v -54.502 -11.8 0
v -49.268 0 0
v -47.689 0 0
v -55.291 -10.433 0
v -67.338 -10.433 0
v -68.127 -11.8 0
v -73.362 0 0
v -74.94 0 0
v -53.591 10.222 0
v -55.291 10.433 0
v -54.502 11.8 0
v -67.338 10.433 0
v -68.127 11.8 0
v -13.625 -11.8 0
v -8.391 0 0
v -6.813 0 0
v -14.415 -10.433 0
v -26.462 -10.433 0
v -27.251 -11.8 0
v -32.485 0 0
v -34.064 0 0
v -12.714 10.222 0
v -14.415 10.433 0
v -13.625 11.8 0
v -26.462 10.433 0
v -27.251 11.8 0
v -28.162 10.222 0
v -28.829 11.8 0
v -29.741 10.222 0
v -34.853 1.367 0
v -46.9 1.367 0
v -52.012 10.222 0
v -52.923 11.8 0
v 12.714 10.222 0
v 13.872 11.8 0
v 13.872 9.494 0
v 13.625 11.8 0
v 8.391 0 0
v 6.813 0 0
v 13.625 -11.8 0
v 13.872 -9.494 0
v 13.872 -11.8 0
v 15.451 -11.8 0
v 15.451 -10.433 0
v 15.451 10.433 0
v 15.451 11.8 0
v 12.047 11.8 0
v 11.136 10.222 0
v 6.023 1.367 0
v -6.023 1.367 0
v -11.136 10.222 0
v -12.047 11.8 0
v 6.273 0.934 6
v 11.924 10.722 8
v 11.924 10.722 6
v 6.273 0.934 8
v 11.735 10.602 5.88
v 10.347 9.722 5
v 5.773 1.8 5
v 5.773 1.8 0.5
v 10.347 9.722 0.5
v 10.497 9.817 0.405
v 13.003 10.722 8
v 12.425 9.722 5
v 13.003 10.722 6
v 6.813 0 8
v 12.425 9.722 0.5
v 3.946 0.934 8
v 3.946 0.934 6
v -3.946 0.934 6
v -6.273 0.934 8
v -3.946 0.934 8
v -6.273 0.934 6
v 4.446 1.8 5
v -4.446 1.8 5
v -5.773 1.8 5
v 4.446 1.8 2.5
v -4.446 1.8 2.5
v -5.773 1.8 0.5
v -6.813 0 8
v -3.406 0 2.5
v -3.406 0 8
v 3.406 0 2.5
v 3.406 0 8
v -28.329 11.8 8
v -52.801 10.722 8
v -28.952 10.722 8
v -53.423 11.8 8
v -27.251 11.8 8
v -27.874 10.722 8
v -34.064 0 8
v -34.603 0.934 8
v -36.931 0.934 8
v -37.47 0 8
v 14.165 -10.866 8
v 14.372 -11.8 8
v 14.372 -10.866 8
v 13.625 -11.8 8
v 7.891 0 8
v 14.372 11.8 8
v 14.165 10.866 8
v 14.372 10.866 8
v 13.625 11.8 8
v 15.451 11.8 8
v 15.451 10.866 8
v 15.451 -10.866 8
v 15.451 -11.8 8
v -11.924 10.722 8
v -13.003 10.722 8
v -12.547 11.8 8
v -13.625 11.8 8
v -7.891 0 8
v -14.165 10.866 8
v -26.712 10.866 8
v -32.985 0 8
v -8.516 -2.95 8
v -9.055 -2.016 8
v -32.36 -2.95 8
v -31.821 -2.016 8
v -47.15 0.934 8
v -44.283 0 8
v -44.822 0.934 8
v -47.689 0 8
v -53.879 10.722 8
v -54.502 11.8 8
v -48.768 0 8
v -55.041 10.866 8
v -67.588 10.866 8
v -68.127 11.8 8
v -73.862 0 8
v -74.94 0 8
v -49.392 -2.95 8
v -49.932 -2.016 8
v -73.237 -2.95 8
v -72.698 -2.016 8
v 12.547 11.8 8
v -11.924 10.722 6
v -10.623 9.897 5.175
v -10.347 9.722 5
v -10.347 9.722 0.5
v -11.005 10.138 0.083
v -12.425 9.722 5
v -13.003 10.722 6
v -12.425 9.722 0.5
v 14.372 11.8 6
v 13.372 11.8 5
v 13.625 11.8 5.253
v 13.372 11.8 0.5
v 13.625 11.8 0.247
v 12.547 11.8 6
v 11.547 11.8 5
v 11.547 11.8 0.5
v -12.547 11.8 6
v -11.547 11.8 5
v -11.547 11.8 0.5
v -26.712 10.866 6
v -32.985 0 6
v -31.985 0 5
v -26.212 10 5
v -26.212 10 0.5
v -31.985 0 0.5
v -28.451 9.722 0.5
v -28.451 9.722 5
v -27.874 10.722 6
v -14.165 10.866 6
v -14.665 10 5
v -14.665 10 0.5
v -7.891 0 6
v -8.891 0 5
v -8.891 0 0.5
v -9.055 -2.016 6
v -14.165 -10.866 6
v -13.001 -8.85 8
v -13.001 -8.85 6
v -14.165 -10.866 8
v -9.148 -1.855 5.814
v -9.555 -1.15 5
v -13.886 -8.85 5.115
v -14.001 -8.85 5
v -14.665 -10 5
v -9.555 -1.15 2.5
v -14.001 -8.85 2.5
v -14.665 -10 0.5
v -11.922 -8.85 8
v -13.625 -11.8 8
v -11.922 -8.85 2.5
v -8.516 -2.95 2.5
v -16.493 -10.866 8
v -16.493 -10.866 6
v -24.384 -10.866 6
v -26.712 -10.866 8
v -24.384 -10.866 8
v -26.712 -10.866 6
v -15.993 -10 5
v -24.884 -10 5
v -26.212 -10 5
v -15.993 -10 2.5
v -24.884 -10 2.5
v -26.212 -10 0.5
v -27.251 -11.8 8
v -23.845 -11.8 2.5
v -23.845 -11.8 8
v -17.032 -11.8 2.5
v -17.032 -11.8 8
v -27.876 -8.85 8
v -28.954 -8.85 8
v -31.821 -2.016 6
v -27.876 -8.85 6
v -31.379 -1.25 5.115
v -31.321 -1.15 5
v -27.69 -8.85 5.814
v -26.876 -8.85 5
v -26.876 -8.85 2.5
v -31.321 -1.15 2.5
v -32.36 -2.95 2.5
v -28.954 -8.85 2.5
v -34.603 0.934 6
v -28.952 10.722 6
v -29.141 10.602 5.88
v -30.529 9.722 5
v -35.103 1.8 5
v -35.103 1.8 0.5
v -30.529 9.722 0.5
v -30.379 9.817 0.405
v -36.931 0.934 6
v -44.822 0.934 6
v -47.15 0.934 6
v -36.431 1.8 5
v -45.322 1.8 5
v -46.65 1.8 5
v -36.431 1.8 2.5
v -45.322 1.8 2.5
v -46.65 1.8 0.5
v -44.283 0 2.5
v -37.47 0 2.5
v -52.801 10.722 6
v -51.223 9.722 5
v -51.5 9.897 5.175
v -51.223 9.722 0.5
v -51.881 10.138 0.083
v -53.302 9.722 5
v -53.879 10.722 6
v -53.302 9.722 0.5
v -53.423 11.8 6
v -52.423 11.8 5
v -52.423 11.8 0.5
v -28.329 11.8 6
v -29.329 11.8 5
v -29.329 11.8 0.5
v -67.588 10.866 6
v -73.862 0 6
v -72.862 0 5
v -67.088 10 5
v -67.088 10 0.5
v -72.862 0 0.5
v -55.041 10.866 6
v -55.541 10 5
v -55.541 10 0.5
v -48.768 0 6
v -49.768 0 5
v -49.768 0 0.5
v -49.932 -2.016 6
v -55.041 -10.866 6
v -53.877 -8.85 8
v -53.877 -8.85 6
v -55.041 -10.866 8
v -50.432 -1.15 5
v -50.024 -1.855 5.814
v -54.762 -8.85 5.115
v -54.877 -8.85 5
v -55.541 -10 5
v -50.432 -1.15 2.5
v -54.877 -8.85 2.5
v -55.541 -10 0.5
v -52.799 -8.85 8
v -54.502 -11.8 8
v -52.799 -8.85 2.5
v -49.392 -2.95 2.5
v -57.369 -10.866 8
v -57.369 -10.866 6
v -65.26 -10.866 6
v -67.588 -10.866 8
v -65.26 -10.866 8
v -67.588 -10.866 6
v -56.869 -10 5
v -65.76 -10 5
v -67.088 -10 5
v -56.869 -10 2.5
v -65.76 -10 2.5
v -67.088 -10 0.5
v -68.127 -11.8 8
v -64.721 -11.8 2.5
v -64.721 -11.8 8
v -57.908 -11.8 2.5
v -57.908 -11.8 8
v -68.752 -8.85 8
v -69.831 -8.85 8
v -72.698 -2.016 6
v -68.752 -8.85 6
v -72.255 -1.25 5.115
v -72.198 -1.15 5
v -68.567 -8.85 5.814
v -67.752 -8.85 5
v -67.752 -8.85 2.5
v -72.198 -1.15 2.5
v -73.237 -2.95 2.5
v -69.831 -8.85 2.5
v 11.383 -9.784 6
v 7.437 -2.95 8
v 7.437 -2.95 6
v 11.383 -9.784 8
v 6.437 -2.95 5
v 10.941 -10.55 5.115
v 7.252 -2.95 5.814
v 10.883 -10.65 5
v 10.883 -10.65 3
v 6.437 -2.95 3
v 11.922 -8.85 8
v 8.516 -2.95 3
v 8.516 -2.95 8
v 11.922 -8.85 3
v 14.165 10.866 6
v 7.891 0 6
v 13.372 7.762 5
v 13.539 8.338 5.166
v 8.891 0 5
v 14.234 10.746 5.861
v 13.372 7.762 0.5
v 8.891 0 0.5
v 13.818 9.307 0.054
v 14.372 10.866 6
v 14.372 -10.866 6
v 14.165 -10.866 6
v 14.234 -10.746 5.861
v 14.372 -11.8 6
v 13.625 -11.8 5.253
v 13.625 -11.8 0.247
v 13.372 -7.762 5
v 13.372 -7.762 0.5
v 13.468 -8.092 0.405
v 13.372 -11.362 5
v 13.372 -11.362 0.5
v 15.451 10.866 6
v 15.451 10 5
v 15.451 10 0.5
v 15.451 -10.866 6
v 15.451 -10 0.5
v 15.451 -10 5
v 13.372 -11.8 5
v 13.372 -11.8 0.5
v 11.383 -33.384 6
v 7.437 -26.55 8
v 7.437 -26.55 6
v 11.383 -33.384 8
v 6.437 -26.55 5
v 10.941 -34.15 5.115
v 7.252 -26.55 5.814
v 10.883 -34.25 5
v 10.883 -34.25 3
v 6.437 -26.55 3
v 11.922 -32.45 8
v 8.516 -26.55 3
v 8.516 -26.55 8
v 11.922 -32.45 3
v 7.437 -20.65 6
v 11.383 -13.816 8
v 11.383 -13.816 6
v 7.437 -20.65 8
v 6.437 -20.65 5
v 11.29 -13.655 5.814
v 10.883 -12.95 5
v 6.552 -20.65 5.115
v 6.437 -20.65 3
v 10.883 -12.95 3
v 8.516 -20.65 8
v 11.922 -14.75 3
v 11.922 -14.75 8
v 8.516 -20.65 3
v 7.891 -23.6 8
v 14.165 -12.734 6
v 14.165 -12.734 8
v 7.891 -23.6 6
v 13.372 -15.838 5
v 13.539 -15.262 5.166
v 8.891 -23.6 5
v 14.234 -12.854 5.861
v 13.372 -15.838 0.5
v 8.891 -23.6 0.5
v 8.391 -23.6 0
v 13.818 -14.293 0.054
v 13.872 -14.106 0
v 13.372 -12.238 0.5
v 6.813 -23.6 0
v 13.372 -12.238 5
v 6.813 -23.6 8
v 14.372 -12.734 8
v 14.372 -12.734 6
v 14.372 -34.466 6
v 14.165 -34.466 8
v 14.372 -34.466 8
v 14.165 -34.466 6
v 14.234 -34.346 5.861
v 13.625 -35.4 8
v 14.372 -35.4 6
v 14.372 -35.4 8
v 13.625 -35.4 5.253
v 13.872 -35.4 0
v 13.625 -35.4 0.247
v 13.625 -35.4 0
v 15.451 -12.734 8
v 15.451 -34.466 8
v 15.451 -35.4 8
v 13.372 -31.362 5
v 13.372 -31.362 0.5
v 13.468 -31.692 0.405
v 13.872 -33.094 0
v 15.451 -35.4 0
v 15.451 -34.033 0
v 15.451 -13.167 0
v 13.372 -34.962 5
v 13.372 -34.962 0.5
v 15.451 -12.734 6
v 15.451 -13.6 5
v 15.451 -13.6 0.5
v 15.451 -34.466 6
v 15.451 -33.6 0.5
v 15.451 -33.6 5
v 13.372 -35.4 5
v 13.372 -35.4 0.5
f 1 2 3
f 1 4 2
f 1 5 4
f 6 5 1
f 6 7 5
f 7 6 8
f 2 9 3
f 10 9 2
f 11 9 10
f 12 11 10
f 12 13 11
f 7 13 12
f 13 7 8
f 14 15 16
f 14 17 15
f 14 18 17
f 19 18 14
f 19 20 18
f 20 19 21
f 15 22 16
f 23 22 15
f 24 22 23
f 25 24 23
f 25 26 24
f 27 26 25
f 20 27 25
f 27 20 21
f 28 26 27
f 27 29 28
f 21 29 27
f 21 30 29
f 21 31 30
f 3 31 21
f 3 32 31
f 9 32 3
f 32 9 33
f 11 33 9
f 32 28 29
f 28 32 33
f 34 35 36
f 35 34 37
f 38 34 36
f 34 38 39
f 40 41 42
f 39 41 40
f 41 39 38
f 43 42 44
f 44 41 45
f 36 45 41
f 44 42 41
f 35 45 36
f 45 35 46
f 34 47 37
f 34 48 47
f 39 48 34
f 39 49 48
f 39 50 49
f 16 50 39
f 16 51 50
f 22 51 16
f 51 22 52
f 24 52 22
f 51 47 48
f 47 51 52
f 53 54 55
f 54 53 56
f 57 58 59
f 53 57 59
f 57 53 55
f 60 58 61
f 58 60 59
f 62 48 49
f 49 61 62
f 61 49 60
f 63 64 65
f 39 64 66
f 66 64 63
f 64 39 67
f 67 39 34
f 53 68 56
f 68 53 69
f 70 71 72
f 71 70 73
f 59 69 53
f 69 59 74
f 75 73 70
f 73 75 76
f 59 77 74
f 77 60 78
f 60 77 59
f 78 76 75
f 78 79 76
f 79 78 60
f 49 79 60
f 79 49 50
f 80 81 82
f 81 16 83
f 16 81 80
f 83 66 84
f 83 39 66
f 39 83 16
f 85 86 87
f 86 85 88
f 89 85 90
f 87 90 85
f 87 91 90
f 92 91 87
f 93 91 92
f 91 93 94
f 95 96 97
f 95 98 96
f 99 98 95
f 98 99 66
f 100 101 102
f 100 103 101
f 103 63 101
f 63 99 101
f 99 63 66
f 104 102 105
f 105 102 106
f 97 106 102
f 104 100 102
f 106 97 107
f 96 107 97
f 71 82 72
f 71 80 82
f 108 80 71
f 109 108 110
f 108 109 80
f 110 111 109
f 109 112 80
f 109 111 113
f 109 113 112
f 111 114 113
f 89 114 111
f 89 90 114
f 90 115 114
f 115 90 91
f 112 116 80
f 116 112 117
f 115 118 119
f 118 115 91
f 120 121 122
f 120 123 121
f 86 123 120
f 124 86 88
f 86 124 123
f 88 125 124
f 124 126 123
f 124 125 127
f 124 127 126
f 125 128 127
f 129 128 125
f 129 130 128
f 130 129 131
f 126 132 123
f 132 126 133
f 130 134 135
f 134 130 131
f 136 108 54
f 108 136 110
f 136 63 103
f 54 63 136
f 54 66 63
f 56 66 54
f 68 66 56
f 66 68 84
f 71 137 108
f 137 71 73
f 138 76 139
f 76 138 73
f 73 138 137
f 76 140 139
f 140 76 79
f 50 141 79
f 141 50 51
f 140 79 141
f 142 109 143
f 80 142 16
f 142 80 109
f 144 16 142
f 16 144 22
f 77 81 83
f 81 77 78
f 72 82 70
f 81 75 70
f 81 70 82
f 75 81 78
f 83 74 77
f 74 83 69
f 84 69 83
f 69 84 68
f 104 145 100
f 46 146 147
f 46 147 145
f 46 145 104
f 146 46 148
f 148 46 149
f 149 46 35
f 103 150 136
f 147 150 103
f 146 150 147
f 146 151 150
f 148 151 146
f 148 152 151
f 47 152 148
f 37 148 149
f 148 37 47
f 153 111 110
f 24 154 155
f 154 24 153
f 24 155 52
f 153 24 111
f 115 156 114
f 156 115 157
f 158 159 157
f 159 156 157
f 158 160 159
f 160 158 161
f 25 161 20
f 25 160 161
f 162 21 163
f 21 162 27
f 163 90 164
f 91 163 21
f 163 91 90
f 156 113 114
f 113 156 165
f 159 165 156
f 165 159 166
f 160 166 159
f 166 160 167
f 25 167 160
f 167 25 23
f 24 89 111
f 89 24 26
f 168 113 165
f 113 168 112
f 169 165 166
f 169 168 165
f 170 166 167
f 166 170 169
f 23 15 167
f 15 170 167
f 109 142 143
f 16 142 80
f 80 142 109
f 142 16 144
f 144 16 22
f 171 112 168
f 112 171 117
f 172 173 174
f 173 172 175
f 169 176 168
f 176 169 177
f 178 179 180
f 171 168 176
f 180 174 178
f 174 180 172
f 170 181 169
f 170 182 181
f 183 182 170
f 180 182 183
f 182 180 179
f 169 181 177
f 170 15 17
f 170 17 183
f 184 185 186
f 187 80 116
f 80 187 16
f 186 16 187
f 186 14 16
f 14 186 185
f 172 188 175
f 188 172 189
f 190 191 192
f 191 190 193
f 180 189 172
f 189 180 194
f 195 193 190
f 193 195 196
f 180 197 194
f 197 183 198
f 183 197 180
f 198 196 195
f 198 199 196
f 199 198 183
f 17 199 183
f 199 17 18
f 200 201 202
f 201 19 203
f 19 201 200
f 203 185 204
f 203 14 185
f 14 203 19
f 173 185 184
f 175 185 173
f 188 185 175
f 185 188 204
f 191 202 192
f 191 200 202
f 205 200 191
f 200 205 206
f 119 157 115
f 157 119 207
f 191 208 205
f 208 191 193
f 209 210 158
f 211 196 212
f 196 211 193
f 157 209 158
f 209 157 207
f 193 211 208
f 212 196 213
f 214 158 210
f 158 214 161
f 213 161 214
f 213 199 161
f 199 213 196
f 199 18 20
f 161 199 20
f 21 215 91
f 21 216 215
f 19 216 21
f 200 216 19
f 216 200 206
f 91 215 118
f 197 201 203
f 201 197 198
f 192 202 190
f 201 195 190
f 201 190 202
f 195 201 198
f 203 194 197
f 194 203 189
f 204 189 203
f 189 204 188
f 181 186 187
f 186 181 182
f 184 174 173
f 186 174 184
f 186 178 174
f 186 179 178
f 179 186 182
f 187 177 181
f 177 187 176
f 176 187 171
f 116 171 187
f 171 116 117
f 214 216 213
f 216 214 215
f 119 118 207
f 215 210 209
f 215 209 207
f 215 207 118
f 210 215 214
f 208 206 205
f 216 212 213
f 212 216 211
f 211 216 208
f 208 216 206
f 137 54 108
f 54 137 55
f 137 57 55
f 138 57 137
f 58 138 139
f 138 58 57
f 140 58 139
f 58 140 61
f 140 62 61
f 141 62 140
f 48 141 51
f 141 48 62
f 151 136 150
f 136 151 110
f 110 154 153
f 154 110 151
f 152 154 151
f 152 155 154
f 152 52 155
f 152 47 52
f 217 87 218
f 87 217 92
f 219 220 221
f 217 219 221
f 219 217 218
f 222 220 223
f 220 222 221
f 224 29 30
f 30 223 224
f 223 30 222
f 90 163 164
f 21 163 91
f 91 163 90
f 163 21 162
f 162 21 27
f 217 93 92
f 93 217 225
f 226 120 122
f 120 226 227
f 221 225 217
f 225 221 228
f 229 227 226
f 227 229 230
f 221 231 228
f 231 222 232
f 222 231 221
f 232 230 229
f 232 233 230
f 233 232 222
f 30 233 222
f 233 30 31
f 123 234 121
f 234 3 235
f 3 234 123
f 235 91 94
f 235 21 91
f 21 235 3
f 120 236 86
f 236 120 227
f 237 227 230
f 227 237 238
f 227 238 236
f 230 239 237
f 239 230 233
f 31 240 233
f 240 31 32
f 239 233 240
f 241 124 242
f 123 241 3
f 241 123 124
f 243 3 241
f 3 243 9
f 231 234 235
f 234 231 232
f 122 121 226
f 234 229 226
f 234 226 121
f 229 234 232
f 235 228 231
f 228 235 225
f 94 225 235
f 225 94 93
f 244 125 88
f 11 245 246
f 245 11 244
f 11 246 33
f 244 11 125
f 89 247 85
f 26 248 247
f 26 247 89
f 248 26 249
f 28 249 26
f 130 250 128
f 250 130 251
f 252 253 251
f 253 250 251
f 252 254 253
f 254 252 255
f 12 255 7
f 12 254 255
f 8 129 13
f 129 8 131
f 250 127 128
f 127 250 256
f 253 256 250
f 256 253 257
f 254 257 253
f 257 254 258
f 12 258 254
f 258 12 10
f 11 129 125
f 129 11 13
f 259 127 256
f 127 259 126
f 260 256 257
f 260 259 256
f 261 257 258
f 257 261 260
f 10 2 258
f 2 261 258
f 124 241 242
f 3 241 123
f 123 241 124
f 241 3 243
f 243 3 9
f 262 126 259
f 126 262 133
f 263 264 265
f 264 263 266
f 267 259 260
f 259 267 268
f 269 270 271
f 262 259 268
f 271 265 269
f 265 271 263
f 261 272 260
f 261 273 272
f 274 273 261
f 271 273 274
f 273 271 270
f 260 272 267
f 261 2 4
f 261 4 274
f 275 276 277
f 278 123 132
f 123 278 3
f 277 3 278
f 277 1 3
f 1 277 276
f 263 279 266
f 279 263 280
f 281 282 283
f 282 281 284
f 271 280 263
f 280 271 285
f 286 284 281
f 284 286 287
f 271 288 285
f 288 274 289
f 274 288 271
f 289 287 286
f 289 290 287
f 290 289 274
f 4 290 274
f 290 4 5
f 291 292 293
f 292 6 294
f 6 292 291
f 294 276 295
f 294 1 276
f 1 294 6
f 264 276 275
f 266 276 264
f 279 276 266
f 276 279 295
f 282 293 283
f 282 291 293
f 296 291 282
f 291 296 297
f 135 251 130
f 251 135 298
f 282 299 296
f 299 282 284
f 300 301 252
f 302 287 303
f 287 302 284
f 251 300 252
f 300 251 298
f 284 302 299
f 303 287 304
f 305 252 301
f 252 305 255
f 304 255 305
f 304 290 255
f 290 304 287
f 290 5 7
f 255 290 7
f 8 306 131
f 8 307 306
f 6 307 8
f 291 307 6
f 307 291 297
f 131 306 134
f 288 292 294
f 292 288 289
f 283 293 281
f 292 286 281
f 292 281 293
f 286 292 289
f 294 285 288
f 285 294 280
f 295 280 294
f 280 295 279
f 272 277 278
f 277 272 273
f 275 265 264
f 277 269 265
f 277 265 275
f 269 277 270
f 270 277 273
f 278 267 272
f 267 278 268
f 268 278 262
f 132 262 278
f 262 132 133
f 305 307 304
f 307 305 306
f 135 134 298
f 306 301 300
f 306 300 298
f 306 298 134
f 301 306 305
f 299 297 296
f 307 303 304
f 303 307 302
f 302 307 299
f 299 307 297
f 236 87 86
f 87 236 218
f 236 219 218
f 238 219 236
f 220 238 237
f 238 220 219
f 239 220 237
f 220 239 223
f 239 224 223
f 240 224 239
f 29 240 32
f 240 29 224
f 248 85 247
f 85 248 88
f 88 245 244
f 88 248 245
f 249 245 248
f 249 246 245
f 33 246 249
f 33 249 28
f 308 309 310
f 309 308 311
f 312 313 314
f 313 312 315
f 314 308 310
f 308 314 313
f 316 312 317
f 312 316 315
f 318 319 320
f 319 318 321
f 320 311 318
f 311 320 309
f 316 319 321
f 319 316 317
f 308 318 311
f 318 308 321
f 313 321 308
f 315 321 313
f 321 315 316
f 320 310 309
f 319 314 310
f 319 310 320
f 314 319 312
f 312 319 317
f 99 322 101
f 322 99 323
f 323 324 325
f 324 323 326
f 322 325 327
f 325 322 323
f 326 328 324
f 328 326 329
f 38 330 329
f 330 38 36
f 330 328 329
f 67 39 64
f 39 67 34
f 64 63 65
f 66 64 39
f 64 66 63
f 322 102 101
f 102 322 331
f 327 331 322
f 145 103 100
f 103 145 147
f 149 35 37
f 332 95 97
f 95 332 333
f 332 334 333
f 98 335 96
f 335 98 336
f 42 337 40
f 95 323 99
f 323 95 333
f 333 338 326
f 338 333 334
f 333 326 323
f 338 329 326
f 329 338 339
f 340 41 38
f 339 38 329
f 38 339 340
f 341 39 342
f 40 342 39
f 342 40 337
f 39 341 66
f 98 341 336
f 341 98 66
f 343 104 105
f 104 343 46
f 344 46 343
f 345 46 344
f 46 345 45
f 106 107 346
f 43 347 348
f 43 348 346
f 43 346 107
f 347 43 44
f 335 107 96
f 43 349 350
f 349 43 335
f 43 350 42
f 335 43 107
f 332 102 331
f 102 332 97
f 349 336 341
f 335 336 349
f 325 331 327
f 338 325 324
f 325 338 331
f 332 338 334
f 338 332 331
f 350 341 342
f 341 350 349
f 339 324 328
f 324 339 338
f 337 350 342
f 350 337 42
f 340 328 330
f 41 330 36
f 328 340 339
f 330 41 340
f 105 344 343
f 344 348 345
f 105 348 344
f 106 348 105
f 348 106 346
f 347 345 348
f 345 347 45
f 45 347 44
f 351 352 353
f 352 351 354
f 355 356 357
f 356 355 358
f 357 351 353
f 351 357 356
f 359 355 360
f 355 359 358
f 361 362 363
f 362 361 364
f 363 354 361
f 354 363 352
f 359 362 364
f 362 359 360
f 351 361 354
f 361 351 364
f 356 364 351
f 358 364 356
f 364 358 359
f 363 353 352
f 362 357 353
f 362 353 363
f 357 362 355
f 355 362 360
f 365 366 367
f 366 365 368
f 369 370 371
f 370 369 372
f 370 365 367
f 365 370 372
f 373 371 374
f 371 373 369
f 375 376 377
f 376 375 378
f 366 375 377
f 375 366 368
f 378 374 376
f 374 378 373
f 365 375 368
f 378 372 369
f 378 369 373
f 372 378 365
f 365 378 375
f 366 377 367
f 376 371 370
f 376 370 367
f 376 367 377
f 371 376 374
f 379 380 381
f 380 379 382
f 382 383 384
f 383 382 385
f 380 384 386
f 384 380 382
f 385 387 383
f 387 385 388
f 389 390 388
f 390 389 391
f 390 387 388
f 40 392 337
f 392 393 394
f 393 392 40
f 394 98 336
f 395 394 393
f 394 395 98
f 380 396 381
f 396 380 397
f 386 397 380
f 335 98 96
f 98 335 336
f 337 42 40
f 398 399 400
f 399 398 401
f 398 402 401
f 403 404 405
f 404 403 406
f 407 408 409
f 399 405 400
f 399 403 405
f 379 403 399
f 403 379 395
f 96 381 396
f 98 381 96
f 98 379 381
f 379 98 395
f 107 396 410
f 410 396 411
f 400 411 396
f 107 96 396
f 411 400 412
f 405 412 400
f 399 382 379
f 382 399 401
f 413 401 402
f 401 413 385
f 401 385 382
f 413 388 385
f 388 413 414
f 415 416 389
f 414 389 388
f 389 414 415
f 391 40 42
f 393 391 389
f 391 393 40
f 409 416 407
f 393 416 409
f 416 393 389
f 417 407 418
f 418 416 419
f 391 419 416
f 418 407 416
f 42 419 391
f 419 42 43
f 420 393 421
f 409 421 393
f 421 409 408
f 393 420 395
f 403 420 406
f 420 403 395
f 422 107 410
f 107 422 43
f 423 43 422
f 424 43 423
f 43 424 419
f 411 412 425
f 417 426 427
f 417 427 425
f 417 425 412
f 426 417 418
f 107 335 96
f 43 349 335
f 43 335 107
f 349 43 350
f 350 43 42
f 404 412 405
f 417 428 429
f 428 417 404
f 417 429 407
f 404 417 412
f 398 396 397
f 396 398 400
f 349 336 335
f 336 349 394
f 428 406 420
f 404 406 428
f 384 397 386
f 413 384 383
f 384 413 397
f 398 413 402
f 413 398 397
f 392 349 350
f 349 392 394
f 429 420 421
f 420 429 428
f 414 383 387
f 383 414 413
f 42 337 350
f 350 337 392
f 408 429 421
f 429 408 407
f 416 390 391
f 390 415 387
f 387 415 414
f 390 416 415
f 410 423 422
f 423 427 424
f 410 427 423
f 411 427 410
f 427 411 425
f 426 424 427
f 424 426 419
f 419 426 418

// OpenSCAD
$fn = 50;

radius = 13.6;
diameter =  radius * 2;

h_inner = 10;
r_inner = h_inner * 2/sqrt(3);

h_outer = 10+1.8;
r_outer = h_outer * 2/sqrt(3);


h_thin = 10+1;
r_thin = h_thin * 2/sqrt(3);

total_height = 8;

small_value = 0.1;


clips_height = 5;
clips_offset = 0.5;
clips_side_offset = 0.00;


module basic_polygon() {
    polygon([[r_outer, total_height], [r_outer, 0], [r_inner+0.5, 0], [r_inner, 0.5], 
        [r_inner, total_height-3], [r_inner+1, total_height-2], [r_inner+1, total_height]]);    
}

module basic_model() {
    rotate_extrude($fn=6) {
      basic_polygon();
    }
}


module panel_with_clips(pin_1=false, pin_2=false, pin_3=false, pin_4=false, pin_5=false, pin_6=false, slot_1=false, slot_2=false, slot_3=false, slot_4=false, slot_5=false, slot_6=false) {



difference() {
basic_model();

if (slot_1) {
rotate([0, 0, 0])
translate([0, -h_outer*2, total_height - (clips_height+clips_offset)/2])
  linear_extrude(height=clips_height+clips_offset, center=true)
    polygon([[clips_side_offset, h_outer/2], [-clips_side_offset, h_outer/2], [-r_outer/2-clips_side_offset, h_outer*1.5], [r_outer/2+clips_side_offset, h_outer*1.5]]);
}

if (slot_2) {
rotate([0, 0, 60])
translate([0, -h_outer*2, total_height - (clips_height+clips_offset)/2])
  linear_extrude(height=clips_height+clips_offset, center=true)
    polygon([[clips_side_offset, h_outer/2], [-clips_side_offset, h_outer/2], [-r_outer/2-clips_side_offset, h_outer*1.5], [r_outer/2+clips_side_offset, h_outer*1.5]]);
}



if (slot_3) {
rotate([0, 0, 120])
translate([0, -h_outer*2, total_height - (clips_height+clips_offset)/2])
  linear_extrude(height=clips_height+clips_offset, center=true)
    polygon([[clips_side_offset, h_outer/2], [-clips_side_offset, h_outer/2], [-r_outer/2-clips_side_offset, h_outer*1.5], [r_outer/2+clips_side_offset, h_outer*1.5]]);
}

if (slot_4) {
rotate([0, 0, 180])
translate([0, -h_outer*2, total_height - (clips_height+clips_offset)/2])
  linear_extrude(height=clips_height+clips_offset, center=true)
    polygon([[clips_side_offset, h_outer/2], [-clips_side_offset, h_outer/2], [-r_outer/2-clips_side_offset, h_outer*1.5], [r_outer/2+clips_side_offset, h_outer*1.5]]);
}

if (slot_5) {
rotate([0, 0, 240])
translate([0, -h_outer*2, total_height - (clips_height+clips_offset)/2])
  linear_extrude(height=clips_height+clips_offset, center=true)
    polygon([[clips_side_offset, h_outer/2], [-clips_side_offset, h_outer/2], [-r_outer/2-clips_side_offset, h_outer*1.5], [r_outer/2+clips_side_offset, h_outer*1.5]]);
}

if (slot_6) {
rotate([0, 0, 300])
translate([0, -h_outer*2, total_height - (clips_height+clips_offset)/2])
  linear_extrude(height=clips_height+clips_offset, center=true)
    polygon([[clips_side_offset, h_outer/2], [-clips_side_offset, h_outer/2], [-r_outer/2-clips_side_offset, h_outer*1.5], [r_outer/2+clips_side_offset, h_outer*1.5]]);
}


}


if (pin_1) {
intersection() {
  translate([0,-h_outer*2, 0])
    basic_model();
translate([0, 0, total_height - clips_height/2]) {
  rotate([0, 0, -180])  
  linear_extrude(height=clips_height, center=true)
    polygon([[0, h_outer/2], [-r_outer/2, h_outer*1.5], [r_outer/2, h_outer*1.5]]);  
}
}
}

if (pin_2) {
intersection() {
  translate([r_outer*1.5,-h_outer, 0])
    basic_model();
translate([0, 0, total_height - clips_height/2]) {
  rotate([0, 0, -120])  
  linear_extrude(height=clips_height, center=true)
    polygon([[0, h_outer/2], [-r_outer/2, h_outer*1.5], [r_outer/2, h_outer*1.5]]);  
}
}
}


if (pin_3) {
intersection() {
  translate([r_outer*1.5,h_outer, 0])
    basic_model();
translate([0, 0, total_height - clips_height/2]) {
  rotate([0, 0, -60])  
  linear_extrude(height=clips_height, center=true)
    polygon([[0, h_outer/2], [-r_outer/2, h_outer*1.5], [r_outer/2, h_outer*1.5]]);  
}
}
}

if (pin_4) {
intersection() {
translate([0, h_outer*2, 0])
  basic_model();

translate([0, 0, total_height - clips_height/2]) {
  linear_extrude(height=clips_height, center=true)
    polygon([[0, h_outer/2], [-r_outer/2, h_outer*1.5], [r_outer/2, h_outer*1.5]]);
}  
}
}

if (pin_5) {
intersection() {
  translate([-r_outer*1.5,h_outer, 0])
    basic_model();
translate([0, 0, total_height - clips_height/2]) {
  rotate([0, 0, 60])  
  linear_extrude(height=clips_height, center=true)
    polygon([[0, h_outer/2], [-r_outer/2, h_outer*1.5], [r_outer/2, h_outer*1.5]]);  
}
}
}
  
if (pin_6) {
intersection() {
  translate([-r_outer*1.5, -h_outer, 0])
    basic_model();

translate([0, 0, total_height - clips_height/2]) {
  rotate([0, 0, 120])  
  linear_extrude(height=clips_height, center=true)
    polygon([[0, h_outer/2], [-r_outer/2, h_outer*1.5], [r_outer/2, h_outer*1.5]]);  
}
}
}


}


module panel_9x9() {
    for (i = [0:8]) {
        for (j = [0:8]) {
            if (j%2==0) {
               translate([r_outer*1.5*j, h_outer+h_outer*2*i, 0])
                  panel_with_clips(
                    slot_1 = i == 0,
                    slot_2 = j == 8,               
                    slot_3 = j == 8,  
                    pin_3 = i == 8 && j != 8,    
                    pin_4 = i == 8,
                    pin_5 = i == 8 || j == 0,
                    pin_6 = j == 0
                    
                  );
            } else {
               translate([r_outer*1.5*j, h_outer*2*i, 0])
                  panel_with_clips(
                    slot_1 = i == 0,
                    slot_2 = i == 0,
                    pin_4 = i == 8,
                    slot_6 = i == 0
                  );
            }
        }
    }
}


// panel_with_clips();


//panel_9x9();

module perimeter_top_item() {
  difference() {
    translate([0, h_outer, 0])
        panel_with_clips(slot_1=true);  
    
    translate([0, 50+h_outer, 0])
        cube([100, 100, 100], center = true);
  }
  
  translate([-r_outer*1.5, 0, 0])
     panel_with_clips(slot_1=true, slot_2=true, slot_6=true); 
  
    
  translate([0, h_outer-r_outer, 0])
      rotate([90, 0, 90])
        linear_extrude(height = r_outer * 2, center=true)
        basic_polygon();
    
}


module perimeter_left_item(pin_5=true, pin_6=true) {
  difference() {
      translate([r_outer * 1.5, 0, 0])
        panel_with_clips(pin_6=pin_6, pin_5=pin_5);
      translate([50+r_outer * 1.5-r_outer/2 + (r_outer-h_outer), 0, 0])
        cube([100, 100, 100], center = true);
  }
  translate([0 + r_outer-h_outer, 0, 0])
    rotate([90, 0, 0])
      linear_extrude(height = h_outer * 2, center=true)
        basic_polygon();
}

module perimeter_corner() {
    
    perimeter_top_item();
    
    translate([-3*r_outer, 0, 0])
    perimeter_top_item();
    
    
    perimeter_left_item(pin_5=false);
    
    translate([0, -h_outer*2, 0])
      perimeter_left_item();

}

module wall_corner() {
    
}

module wall_corner_perimeter() {
    
}


perimeter_corner();
